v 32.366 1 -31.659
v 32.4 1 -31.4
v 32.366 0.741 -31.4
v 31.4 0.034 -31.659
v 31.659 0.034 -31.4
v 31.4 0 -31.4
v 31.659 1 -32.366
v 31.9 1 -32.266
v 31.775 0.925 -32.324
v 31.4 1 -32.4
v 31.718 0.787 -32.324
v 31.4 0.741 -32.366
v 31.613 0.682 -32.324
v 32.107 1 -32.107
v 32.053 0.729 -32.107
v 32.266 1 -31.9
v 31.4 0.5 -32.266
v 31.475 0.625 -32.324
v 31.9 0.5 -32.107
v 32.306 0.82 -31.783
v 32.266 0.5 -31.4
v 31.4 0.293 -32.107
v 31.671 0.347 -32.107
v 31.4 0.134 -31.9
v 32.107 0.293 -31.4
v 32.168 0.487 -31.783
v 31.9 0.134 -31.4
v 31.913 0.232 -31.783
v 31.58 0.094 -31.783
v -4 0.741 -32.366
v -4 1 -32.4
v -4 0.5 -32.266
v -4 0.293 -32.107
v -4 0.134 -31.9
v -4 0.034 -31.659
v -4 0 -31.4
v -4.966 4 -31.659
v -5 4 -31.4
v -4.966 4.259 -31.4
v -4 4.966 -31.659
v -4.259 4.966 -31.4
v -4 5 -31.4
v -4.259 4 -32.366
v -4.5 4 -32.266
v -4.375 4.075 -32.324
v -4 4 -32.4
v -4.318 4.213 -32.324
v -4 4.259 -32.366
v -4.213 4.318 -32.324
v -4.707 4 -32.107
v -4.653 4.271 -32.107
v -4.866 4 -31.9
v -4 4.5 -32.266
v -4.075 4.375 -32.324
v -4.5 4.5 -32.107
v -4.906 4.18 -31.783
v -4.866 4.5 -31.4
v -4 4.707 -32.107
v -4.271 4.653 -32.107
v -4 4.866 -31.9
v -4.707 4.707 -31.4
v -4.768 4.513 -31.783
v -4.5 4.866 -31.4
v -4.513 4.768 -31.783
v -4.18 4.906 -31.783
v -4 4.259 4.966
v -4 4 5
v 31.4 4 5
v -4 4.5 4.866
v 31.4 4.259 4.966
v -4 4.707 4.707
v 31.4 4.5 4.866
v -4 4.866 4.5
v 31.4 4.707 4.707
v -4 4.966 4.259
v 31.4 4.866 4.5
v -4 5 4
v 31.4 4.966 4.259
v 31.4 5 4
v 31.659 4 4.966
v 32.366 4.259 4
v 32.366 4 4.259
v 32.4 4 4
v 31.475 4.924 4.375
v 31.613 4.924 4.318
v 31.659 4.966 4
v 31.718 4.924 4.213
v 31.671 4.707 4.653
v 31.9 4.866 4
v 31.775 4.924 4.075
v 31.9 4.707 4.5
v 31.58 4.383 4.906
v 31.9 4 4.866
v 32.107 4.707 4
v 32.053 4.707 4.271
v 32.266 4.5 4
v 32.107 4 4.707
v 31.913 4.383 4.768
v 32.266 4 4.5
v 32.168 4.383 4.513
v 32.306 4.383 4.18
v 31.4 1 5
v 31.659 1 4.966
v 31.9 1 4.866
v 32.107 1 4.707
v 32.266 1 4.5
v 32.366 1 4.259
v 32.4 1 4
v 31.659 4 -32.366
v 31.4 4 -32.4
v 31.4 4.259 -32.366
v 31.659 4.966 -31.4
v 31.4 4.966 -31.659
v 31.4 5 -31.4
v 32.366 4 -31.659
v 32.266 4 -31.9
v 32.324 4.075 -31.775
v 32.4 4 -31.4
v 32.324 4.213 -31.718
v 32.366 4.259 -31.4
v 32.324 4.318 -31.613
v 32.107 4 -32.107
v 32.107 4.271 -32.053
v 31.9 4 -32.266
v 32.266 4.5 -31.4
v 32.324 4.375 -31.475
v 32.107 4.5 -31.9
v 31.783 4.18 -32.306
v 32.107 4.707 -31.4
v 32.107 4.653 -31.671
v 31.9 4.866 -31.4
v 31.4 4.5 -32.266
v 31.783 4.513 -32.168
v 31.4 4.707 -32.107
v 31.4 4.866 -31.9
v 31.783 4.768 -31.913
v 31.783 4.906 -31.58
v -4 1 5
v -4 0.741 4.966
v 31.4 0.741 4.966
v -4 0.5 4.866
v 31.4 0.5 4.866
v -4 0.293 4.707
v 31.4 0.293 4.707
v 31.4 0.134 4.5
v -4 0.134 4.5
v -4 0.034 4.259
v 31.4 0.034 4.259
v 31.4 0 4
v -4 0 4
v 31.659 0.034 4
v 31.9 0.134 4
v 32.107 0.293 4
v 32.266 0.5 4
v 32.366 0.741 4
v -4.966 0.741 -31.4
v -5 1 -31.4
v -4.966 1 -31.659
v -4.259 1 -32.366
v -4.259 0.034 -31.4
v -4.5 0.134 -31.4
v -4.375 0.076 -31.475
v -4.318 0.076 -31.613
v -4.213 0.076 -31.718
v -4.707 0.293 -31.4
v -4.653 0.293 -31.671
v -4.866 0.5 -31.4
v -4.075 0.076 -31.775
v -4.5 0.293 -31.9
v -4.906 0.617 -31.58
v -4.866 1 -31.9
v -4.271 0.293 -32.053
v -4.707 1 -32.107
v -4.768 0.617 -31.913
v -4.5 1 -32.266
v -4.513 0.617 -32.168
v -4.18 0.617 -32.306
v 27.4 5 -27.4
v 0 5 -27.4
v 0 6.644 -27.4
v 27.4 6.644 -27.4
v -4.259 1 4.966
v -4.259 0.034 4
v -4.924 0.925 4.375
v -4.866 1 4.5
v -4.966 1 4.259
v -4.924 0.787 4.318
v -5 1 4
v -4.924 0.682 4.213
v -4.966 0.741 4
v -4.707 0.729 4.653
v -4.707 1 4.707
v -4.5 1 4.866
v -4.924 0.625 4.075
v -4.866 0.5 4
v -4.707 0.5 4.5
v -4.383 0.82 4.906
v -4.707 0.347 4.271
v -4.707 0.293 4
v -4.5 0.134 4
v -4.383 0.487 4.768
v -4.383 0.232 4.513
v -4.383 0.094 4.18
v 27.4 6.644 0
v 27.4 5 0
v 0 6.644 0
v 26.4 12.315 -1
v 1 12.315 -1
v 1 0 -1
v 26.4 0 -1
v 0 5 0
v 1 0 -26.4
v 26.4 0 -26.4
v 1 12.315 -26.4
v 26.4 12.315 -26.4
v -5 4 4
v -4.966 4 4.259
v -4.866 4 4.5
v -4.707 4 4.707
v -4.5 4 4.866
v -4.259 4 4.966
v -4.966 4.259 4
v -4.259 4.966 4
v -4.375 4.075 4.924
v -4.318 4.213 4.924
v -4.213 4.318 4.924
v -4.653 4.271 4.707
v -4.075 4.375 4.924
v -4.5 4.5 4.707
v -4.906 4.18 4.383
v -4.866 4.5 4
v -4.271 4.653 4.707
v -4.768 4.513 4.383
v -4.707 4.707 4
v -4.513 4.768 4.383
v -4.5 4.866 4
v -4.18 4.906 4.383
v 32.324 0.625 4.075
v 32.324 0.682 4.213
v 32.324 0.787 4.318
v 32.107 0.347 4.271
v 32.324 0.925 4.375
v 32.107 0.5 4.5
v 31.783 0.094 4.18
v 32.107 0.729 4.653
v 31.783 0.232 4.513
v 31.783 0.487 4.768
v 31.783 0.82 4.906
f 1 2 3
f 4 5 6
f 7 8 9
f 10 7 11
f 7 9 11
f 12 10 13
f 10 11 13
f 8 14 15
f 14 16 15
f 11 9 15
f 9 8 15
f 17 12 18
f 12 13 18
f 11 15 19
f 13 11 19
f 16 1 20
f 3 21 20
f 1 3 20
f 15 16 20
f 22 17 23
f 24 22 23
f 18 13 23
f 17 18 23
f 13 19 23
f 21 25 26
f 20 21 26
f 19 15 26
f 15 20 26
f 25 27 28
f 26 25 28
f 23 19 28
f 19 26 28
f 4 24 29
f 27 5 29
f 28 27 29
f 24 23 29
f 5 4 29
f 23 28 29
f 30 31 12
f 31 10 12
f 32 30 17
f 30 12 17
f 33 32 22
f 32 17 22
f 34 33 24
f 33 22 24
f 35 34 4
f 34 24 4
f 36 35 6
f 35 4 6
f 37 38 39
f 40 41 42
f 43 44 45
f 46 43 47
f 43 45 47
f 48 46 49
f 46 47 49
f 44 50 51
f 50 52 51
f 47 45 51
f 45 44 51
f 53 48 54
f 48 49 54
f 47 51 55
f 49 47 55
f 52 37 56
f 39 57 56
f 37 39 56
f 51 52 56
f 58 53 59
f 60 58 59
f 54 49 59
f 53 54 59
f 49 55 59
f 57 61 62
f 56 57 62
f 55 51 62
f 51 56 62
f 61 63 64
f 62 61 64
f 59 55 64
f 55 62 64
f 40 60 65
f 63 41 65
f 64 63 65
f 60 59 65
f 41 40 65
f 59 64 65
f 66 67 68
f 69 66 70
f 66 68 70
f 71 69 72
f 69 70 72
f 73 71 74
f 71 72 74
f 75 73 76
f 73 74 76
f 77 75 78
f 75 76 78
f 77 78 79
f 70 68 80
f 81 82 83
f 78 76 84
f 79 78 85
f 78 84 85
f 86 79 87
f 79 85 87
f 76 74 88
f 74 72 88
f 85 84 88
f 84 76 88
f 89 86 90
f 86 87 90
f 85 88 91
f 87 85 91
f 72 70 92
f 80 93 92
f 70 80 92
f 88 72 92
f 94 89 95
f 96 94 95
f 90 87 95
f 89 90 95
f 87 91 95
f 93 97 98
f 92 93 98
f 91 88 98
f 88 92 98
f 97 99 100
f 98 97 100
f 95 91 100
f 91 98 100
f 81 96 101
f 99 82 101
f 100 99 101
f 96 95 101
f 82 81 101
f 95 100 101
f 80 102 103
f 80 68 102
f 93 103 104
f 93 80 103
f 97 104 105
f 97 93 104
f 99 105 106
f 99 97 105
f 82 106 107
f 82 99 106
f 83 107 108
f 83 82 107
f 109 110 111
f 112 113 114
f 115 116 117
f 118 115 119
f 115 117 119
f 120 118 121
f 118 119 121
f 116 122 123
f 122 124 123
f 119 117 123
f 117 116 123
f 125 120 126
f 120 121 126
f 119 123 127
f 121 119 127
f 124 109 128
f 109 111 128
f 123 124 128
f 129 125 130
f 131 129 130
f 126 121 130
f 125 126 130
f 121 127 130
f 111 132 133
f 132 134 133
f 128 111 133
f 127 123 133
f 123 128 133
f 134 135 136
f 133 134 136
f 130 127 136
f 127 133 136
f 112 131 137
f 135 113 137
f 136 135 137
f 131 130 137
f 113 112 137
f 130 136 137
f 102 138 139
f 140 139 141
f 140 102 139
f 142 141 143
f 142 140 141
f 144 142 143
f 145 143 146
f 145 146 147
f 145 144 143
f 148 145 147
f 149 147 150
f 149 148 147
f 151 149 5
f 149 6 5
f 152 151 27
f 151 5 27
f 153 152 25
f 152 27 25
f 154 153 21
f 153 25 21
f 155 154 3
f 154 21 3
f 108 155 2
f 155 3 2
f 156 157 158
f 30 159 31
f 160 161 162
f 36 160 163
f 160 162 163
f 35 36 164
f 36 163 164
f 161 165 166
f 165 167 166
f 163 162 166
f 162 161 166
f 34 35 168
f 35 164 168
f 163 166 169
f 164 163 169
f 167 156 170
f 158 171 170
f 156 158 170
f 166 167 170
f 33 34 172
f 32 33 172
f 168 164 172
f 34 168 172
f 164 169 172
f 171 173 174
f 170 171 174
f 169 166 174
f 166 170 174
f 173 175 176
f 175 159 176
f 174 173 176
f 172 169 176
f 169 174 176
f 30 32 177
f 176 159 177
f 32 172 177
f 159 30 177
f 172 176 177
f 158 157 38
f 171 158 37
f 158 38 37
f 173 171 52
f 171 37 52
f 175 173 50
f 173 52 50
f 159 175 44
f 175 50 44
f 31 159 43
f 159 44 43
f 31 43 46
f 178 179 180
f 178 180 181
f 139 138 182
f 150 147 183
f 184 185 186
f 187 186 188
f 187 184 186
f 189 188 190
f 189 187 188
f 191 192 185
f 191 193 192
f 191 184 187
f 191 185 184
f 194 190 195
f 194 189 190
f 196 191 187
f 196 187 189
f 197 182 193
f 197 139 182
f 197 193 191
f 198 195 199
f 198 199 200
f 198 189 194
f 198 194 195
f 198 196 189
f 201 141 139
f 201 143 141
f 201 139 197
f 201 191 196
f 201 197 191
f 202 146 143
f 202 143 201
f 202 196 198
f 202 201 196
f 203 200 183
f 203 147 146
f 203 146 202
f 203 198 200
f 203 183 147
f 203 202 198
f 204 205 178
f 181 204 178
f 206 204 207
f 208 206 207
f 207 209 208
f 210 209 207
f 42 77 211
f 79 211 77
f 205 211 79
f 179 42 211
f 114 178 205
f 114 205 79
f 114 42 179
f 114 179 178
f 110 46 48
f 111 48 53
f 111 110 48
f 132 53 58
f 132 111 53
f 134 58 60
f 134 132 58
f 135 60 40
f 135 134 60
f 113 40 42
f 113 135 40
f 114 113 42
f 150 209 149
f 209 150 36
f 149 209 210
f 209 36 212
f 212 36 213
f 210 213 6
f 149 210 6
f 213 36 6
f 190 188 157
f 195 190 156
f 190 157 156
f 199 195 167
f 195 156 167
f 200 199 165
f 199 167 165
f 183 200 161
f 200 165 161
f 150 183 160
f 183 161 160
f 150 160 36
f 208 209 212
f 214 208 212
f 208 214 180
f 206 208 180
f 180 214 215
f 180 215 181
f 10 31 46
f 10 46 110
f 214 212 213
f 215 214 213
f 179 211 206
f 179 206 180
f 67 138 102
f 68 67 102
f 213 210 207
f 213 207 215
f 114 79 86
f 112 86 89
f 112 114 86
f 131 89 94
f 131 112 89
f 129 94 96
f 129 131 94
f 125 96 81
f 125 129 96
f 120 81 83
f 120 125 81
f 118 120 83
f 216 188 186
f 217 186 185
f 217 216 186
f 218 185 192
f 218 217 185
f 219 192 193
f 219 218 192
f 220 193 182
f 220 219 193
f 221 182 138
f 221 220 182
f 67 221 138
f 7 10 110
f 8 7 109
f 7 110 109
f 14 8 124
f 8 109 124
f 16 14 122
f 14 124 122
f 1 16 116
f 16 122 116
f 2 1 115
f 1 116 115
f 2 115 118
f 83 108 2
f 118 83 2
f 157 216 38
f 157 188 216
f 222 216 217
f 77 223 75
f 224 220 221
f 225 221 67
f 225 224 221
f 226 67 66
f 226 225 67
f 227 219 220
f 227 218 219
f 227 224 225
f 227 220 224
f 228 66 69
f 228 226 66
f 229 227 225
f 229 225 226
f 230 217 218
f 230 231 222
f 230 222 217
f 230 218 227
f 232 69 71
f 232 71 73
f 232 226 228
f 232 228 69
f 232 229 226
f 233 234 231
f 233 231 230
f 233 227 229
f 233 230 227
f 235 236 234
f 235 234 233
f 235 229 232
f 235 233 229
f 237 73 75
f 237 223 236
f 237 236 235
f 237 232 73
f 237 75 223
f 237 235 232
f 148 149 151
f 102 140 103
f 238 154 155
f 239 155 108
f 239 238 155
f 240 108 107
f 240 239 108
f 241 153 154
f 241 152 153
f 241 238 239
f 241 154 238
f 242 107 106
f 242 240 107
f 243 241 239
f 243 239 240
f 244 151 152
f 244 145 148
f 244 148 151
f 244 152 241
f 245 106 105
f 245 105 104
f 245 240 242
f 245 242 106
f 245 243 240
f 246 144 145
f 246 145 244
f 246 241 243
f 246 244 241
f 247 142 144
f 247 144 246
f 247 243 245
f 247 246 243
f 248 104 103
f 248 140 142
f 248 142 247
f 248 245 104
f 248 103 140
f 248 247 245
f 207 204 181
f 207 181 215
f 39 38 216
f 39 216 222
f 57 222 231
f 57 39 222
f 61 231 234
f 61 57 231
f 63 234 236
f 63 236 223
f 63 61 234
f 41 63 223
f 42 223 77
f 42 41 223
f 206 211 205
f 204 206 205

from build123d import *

# Parameters (mm, degrees)
SKETCH1_W           = 27.4
SKETCH1_H           = 27.4
SKETCH1_W_2         = 25.4
SKETCH1_H_2         = 25.4
BOSS_EXTRUDE1_DEPTH = 35
SKETCH1_3_W         = 37.4
SKETCH1_3_H         = 37.4
SKETCH1_3_W_2       = 27.4
SKETCH1_3_H_2       = 27.4
BOSS_EXTRUDE2_DEPTH = 5
CHAMFER1_SIZE       = 5
CHAMFER1_SIZE_2     = 28.356409098
FILLET1_R           = 1


with BuildPart() as part:
    # Sketch1 → Boss-Extrude1 (new body)
    with BuildSketch(Plane(origin=(0, 0, 0), x_dir=(1, 0, 0), z_dir=(0, 1, 0))):
        with Locations((13.7, 13.7)):
            Rectangle(SKETCH1_W, SKETCH1_H)
        with Locations((13.7, 13.7)):
            Rectangle(SKETCH1_W_2, SKETCH1_H_2, mode=Mode.SUBTRACT)
    extrude(amount=BOSS_EXTRUDE1_DEPTH)

    # Sketch1<3> → Boss-Extrude2 (add)
    with BuildSketch(Plane(origin=(0, 0, 0), x_dir=(1, 0, 0), z_dir=(0, 1, 0))):
        with Locations((13.7, 13.7)):
            Rectangle(SKETCH1_3_W, SKETCH1_3_H)
        with Locations((13.7, 13.7)):
            Rectangle(SKETCH1_3_W_2, SKETCH1_3_H_2, mode=Mode.SUBTRACT)
    extrude(amount=BOSS_EXTRUDE2_DEPTH)

    # Chamfer1
    # the kernel refuses this chamfer: 28.356409098, 5 mm, written as the material it takes off along each edge
    with BuildSketch(Plane(origin=(101.085229169, 35, -27.4), x_dir=(0, 0.2101387607674354, 0.9776715712462578), z_dir=(-1, 0, 0)), Plane(origin=(0, 35, -101.085229169), x_dir=(0.9776715712462578, 0.2101387607674354, 0), z_dir=(0, 0, 1))) as chamfer1_piece_1:
        Polygon((CHAMFER1_SIZE * 0.977671571246, -CHAMFER1_SIZE * 0.210138760767), (-CHAMFER1_SIZE_2 * 0.210138760768, -CHAMFER1_SIZE_2 * 0.977671571249), (0, 0), align=None)
    extrude(amount=174.770458337, mode=Mode.SUBTRACT)
    with BuildSketch(Plane(origin=(27.4, 35, 73.685229169), x_dir=(0.006682531656101585, -0.9999776716360547, 0), z_dir=(0, 0, -1)), Plane(origin=(-73.685229169, 35, 0), x_dir=(0, -0.9999776716360547, 0.006682531656101581), z_dir=(1, 0, 0))) as chamfer1_piece_2:
        Polygon((CHAMFER1_SIZE_2 * 0.999977671639, CHAMFER1_SIZE_2 * 0.00668253165612), (-CHAMFER1_SIZE * 0.0066825316561, CHAMFER1_SIZE * 0.999977671636), (0, 0), align=None)
    extrude(amount=174.770458337, mode=Mode.SUBTRACT)

    # Fillet1
    fillet1_edges = [part.edges().sort_by_distance(p)[0] for p in [
        (-5, 5, -13.7),
        (-5, 2.5, -32.4),
        (13.7, 0, 5),
        (-5, 2.5, 5),
        (32.4, 0, -13.7),
        (32.4, 2.5, 5),
        (13.7, 5, -32.4),
        (32.4, 2.5, -32.4),
        (13.7, 5, 5),
        (32.4, 5, -13.7),
        (-5, 0, -13.7),
        (13.7, 0, -32.4),
    ]]
    fillet(fillet1_edges, radius=FILLET1_R)


solid = part.part
